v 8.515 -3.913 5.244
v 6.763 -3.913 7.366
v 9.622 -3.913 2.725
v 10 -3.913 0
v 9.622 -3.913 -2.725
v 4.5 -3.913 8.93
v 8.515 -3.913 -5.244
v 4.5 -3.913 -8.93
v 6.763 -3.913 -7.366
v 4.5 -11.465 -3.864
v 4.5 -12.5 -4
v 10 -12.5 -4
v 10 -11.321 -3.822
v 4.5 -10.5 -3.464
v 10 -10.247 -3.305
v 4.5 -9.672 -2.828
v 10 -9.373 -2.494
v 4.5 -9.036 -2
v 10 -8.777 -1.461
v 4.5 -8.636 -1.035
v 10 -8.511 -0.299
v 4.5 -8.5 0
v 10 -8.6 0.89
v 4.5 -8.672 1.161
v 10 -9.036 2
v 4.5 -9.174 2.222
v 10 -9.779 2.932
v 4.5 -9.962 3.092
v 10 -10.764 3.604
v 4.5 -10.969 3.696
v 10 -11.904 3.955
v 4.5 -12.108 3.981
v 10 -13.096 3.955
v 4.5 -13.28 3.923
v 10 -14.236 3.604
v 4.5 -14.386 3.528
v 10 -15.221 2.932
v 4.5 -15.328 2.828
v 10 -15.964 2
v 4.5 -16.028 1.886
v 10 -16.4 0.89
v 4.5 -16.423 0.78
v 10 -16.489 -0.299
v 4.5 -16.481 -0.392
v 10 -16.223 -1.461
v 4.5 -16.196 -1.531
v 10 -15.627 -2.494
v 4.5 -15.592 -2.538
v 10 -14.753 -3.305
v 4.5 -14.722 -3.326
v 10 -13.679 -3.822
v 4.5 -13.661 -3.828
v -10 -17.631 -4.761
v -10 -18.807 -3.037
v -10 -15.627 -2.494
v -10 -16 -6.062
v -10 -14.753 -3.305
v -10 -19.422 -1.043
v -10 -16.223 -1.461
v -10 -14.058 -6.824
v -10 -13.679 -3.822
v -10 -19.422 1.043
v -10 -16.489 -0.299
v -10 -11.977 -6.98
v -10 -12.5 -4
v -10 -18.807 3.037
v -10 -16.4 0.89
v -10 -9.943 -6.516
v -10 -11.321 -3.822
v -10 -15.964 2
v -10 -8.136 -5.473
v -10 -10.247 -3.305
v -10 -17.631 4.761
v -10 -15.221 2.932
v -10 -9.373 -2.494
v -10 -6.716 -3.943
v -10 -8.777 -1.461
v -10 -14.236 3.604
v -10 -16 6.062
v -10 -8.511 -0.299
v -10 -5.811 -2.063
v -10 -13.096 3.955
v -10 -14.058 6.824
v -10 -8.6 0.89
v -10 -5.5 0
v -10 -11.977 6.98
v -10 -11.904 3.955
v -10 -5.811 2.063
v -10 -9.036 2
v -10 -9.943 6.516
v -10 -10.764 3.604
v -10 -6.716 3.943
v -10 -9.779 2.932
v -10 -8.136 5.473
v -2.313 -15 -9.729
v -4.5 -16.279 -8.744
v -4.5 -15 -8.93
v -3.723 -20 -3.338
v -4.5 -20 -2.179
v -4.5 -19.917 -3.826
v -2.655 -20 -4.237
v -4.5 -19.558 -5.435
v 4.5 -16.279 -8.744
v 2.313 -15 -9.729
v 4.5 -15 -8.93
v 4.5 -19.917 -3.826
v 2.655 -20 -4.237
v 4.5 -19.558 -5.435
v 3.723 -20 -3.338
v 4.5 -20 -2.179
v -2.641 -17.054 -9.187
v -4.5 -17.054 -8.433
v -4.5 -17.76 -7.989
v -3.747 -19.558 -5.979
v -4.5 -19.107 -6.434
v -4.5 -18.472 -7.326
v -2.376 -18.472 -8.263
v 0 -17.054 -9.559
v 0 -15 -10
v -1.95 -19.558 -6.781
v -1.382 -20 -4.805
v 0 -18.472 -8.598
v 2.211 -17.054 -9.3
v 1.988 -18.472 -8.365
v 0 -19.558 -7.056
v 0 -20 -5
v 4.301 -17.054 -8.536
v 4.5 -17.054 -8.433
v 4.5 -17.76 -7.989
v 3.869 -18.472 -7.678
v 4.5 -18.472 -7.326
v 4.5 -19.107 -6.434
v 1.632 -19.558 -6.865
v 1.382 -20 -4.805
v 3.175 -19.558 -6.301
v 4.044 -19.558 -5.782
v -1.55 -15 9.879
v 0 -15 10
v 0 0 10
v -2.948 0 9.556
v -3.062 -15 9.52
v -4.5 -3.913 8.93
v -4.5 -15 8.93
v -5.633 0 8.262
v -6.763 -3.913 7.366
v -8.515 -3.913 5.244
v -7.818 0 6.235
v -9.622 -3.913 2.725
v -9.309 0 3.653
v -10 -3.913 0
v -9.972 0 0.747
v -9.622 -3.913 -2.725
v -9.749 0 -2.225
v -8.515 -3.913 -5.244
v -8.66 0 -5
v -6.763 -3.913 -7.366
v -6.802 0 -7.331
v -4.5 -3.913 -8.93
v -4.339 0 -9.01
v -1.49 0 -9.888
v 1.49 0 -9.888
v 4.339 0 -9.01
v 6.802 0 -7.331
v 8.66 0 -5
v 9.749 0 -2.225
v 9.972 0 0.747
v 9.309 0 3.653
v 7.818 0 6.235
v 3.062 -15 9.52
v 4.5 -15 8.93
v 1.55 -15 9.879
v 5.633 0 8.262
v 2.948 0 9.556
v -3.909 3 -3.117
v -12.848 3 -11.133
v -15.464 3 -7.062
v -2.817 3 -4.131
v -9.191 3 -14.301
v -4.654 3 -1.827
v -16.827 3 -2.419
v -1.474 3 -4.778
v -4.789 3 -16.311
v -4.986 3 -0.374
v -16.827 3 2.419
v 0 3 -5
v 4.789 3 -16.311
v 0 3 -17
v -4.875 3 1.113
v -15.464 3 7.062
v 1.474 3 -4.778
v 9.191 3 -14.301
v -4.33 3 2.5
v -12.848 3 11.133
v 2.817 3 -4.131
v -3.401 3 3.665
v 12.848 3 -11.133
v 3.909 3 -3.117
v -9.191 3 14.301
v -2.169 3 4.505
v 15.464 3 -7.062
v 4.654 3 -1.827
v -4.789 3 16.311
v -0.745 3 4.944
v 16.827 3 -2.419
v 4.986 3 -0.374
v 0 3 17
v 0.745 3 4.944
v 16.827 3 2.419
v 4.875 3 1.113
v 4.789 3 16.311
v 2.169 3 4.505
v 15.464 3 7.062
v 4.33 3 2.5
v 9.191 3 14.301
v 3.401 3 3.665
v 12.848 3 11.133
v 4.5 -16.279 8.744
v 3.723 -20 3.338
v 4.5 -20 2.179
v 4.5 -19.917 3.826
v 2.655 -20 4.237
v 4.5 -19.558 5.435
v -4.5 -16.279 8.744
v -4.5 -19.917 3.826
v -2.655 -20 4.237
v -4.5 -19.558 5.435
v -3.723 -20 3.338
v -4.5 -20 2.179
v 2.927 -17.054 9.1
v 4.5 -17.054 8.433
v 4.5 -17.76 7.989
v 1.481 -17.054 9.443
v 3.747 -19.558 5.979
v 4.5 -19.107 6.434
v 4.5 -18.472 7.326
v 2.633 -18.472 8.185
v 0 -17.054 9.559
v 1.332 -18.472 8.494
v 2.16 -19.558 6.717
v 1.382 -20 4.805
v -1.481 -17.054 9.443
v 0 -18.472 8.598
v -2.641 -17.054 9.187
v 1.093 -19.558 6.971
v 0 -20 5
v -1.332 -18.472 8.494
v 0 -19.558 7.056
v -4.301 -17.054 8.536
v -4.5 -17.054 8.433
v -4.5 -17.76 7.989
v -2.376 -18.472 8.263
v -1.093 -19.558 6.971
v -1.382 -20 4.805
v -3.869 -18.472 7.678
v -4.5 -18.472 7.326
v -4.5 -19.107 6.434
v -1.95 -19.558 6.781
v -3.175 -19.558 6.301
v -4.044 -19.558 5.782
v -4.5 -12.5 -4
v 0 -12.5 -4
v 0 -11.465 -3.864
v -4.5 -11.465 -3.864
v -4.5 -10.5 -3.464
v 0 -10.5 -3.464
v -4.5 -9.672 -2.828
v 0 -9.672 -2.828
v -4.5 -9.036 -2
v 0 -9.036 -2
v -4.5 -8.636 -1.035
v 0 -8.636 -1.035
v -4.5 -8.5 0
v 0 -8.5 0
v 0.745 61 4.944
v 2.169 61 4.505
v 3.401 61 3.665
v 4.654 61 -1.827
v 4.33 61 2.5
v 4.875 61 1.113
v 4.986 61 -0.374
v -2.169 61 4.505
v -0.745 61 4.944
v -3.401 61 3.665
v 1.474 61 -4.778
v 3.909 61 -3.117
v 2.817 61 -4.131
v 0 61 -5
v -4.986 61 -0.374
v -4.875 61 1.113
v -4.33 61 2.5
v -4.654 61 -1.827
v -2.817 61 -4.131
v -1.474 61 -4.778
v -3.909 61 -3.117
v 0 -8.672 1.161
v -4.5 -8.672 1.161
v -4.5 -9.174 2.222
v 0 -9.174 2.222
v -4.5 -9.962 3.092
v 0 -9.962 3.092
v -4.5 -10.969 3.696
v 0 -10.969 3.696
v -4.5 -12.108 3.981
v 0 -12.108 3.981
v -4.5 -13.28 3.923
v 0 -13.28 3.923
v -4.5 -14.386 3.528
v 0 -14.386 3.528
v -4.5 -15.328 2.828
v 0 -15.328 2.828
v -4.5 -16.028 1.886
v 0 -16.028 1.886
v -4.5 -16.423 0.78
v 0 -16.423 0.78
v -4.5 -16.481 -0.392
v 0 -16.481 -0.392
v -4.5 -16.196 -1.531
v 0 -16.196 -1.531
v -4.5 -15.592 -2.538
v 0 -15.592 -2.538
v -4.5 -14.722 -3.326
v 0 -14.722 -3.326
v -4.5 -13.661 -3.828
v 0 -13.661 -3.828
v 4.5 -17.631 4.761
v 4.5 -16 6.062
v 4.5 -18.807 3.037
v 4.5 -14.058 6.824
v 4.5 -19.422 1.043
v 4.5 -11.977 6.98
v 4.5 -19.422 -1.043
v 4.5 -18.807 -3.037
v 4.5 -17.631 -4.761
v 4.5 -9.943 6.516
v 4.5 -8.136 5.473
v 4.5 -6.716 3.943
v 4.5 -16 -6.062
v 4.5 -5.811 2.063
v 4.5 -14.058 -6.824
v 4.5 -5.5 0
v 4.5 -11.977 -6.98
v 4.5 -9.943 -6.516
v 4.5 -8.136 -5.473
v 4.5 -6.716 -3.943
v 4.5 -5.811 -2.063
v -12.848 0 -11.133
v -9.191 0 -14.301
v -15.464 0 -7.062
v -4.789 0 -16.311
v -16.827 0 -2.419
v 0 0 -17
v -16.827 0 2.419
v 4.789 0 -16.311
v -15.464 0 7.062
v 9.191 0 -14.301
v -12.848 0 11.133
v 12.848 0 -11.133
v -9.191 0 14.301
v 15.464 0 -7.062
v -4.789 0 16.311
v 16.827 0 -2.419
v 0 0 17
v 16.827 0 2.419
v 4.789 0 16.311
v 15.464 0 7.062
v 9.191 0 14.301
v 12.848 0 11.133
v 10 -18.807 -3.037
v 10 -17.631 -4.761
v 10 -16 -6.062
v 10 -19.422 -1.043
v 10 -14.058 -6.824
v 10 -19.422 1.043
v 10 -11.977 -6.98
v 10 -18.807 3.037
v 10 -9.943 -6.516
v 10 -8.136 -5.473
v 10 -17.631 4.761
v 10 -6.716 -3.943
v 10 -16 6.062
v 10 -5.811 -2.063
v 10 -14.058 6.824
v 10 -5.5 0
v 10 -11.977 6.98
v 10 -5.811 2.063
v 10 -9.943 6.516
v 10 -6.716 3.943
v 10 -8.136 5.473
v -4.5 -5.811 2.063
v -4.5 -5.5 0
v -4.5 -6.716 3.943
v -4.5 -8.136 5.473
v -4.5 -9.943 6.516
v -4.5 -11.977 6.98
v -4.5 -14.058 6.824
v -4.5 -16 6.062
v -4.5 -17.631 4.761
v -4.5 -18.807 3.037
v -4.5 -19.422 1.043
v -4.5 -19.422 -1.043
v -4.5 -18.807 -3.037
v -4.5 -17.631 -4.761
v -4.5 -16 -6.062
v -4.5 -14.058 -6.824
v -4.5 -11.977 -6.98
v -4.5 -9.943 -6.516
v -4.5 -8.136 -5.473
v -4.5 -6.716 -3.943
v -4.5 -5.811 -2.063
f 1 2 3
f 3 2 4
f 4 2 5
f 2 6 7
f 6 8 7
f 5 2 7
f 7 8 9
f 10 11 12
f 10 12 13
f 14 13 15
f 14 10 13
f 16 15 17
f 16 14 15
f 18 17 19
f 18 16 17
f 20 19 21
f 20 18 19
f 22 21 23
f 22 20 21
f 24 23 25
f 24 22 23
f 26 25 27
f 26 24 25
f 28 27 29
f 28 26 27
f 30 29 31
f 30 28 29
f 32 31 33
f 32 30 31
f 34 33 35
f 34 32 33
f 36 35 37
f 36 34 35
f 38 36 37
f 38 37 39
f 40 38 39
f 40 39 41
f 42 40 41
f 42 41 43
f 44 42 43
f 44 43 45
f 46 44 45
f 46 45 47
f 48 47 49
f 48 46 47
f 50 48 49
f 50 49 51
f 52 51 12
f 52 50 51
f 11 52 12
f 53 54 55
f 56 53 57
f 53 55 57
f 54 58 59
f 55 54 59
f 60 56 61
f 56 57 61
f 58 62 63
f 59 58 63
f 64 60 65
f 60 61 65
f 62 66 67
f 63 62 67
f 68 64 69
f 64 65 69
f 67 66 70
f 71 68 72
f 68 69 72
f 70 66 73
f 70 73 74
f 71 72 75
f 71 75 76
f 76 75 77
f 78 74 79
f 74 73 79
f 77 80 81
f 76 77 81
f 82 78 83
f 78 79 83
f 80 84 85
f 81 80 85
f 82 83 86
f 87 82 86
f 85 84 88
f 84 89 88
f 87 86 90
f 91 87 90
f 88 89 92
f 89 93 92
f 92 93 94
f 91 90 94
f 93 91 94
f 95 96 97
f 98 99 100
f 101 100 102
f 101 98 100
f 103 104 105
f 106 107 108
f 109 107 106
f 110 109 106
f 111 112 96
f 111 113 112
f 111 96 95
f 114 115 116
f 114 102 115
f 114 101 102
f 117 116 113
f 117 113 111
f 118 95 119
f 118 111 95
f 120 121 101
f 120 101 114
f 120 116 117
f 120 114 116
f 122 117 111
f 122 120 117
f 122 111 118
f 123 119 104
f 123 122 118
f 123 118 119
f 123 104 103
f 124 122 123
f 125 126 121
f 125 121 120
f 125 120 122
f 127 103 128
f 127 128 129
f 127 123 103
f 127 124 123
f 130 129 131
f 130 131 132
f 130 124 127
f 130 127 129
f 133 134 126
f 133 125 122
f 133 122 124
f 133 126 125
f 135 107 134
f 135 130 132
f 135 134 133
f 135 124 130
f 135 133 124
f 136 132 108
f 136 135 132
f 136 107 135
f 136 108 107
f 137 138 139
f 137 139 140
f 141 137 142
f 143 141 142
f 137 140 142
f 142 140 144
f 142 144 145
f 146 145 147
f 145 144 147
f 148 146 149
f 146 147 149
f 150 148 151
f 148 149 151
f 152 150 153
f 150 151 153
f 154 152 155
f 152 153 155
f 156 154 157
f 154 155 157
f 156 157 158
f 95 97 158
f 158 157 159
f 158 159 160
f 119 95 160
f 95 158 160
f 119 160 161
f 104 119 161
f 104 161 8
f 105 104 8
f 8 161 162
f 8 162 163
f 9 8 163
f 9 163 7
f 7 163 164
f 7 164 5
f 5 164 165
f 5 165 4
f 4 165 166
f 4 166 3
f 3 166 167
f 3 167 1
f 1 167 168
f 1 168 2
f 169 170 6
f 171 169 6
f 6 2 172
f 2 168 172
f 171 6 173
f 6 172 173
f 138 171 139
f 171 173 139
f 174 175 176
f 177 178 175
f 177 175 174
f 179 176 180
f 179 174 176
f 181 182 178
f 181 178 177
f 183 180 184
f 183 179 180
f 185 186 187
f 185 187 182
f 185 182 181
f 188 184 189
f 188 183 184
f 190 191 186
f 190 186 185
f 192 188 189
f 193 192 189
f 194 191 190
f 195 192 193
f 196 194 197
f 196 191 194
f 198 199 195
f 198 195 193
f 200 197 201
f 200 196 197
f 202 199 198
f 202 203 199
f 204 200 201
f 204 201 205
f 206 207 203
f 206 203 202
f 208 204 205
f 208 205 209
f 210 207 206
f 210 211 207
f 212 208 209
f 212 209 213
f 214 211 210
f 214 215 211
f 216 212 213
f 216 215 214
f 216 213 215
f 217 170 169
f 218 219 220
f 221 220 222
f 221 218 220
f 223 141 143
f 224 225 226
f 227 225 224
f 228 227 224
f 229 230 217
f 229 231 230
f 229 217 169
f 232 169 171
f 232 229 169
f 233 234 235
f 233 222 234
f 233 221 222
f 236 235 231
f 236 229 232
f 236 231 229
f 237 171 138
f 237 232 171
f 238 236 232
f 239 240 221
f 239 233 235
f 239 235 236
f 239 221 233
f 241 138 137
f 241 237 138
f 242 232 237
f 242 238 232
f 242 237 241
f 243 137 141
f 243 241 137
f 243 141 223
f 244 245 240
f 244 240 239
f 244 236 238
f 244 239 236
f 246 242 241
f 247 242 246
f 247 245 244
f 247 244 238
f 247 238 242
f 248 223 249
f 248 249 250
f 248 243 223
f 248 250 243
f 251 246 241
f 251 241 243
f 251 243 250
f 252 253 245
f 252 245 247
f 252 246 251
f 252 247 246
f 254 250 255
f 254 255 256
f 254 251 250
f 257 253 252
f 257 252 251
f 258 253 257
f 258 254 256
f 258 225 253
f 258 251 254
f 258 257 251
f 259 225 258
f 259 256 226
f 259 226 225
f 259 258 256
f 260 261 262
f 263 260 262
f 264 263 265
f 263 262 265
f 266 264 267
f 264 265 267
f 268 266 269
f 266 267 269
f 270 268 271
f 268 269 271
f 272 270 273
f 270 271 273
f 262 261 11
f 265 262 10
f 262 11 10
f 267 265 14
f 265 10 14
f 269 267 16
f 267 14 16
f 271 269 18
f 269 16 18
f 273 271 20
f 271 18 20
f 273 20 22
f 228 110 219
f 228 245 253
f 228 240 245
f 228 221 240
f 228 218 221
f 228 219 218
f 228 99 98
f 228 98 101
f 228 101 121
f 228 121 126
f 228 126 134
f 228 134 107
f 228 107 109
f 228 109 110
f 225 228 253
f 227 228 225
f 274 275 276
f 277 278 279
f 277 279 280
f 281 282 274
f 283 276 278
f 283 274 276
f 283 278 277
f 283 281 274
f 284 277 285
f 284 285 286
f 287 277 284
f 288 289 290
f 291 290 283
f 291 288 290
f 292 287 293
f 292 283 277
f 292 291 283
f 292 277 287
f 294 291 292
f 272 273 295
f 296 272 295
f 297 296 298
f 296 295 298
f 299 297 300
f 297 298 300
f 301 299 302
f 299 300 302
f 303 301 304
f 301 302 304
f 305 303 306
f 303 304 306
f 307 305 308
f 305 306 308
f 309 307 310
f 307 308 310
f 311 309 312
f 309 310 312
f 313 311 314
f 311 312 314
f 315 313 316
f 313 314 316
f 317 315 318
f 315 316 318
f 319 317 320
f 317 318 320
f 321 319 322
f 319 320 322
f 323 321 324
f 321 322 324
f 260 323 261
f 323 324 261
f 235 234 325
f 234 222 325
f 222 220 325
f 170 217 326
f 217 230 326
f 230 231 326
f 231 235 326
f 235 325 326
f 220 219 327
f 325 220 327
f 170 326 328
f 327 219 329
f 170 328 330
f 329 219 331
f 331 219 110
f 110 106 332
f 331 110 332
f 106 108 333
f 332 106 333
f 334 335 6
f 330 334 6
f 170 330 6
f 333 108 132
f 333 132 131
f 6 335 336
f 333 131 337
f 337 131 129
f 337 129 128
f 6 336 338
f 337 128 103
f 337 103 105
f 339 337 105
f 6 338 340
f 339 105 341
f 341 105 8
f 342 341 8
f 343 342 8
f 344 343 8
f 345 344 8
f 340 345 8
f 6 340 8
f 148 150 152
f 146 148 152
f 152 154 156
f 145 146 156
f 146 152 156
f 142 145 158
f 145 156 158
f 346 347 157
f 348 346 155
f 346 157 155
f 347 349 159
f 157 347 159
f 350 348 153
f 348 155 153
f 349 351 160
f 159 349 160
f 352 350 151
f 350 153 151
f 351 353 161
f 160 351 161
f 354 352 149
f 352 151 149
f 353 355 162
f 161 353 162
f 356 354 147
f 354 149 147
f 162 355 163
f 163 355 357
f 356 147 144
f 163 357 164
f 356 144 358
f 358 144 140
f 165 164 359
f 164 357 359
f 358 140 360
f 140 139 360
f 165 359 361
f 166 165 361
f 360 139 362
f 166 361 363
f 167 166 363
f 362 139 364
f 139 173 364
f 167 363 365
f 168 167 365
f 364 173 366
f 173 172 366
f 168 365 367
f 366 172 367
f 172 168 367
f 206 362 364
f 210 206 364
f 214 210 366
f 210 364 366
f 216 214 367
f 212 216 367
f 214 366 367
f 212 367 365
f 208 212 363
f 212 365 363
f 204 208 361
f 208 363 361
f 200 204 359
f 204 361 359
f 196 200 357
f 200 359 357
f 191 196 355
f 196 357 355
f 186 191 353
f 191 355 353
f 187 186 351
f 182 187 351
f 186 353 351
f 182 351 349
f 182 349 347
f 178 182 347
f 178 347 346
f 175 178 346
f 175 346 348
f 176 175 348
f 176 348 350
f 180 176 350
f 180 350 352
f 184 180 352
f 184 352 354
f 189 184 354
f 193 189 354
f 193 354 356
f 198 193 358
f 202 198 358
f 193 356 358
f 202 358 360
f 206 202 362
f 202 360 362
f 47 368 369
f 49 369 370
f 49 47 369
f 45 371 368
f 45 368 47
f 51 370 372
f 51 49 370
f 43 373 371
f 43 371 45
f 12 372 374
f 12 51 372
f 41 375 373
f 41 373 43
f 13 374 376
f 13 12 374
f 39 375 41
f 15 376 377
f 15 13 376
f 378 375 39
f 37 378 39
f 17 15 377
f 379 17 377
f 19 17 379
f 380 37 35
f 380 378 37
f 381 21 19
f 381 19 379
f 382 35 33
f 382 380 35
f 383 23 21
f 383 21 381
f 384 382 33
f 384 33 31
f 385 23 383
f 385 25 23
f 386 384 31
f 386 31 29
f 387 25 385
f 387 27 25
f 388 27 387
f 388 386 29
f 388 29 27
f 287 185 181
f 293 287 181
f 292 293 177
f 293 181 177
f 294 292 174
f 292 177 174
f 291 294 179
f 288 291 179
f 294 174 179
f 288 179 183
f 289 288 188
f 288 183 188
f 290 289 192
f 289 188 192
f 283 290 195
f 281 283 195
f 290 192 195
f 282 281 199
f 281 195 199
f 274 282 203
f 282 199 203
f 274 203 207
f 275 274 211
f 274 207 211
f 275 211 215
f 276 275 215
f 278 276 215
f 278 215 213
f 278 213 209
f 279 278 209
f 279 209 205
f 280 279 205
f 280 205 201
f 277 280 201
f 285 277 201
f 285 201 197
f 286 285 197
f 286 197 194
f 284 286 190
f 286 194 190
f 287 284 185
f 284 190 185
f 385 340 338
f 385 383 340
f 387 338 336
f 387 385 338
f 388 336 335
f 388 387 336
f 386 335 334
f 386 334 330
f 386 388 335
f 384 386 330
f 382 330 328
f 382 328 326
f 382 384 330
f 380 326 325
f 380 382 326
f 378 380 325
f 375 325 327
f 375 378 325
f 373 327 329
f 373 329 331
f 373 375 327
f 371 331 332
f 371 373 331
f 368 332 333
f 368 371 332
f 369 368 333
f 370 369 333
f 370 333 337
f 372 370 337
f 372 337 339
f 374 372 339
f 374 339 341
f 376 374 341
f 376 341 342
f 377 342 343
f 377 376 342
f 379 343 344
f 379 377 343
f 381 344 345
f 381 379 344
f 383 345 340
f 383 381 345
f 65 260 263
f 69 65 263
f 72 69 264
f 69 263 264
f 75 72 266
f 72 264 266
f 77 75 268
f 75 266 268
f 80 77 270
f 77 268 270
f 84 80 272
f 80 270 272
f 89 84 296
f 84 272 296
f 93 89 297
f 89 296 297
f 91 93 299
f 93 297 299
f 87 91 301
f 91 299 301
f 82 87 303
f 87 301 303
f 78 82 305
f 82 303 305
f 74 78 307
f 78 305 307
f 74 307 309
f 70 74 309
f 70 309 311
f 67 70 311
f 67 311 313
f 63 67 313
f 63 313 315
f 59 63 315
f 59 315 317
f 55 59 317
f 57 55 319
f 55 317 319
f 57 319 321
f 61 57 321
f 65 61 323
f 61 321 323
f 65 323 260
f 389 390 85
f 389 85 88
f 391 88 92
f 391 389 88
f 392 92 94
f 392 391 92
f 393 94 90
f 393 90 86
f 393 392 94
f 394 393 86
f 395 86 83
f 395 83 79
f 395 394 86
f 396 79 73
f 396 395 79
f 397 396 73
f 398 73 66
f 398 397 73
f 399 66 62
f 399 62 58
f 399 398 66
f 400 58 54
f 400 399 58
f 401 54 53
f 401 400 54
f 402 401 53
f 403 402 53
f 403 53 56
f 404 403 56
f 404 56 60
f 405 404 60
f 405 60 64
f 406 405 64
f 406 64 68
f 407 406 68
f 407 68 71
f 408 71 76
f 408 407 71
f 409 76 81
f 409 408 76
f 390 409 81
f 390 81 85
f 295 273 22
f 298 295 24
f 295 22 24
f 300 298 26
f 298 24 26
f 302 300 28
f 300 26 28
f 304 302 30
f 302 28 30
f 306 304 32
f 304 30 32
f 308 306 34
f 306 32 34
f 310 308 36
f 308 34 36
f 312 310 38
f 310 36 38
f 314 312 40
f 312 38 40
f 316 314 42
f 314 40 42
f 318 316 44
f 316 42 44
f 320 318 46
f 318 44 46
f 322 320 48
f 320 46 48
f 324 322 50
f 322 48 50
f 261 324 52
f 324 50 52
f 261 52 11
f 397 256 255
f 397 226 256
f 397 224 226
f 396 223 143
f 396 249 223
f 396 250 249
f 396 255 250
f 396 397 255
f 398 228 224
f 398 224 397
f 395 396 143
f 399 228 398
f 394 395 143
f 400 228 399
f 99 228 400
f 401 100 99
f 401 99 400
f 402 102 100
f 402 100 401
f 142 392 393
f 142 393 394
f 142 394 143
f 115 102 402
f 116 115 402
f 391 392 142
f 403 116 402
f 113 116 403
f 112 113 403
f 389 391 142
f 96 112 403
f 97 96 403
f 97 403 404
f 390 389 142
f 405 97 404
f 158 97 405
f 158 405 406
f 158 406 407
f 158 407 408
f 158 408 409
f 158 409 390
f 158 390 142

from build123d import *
from build123d.topology import SkipClean

# Parameters (mm, degrees)
SKETCH1_R           = 17
BOSS_EXTRUDE1_DEPTH = 3
SKETCH2_R           = 5
BOSS_EXTRUDE2_DEPTH = 58
SKETCH3_R           = 10
BOSS_EXTRUDE3_DEPTH = 20
FILLET1_R           = 5
CUT_EXTRUDE1_START  = -8.930286
SKETCH4_W           = 7.220401321
SKETCH4_H           = 16.086512415
CUT_EXTRUDE1_DEPTH  = 17.860572
SKETCH5_R           = 4
CUT_EXTRUDE2_DEPTH  = 20
SKETCH6_R           = 7
SKETCH6_R_2         = 4
BOSS_EXTRUDE4_DEPTH = 10


with BuildPart() as part:
    # Sketch1 → Boss-Extrude1 (new body)
    with BuildSketch(Plane(origin=(0, 0, 0), x_dir=(1, 0, 0), z_dir=(0, 1, 0))):
        with Locations(Location((0, 0, 0), (0, 0, 270))):
            Circle(SKETCH1_R)
    extrude(amount=BOSS_EXTRUDE1_DEPTH)

    # Sketch2 → Boss-Extrude2 (add)
    with BuildSketch(Plane(origin=(0, 3, 0), x_dir=(1, 0, 0), z_dir=(0, 1, 0))):
        with Locations(Location((0, 0, 0), (0, 0, 90))):
            Circle(SKETCH2_R)
    extrude(amount=BOSS_EXTRUDE2_DEPTH)

    # Sketch3 → Boss-Extrude3 (add)
    with BuildSketch(Plane.XZ):
        with Locations(Location((0, 0, 0), (0, 0, 90))):
            Circle(SKETCH3_R)
    extrude(amount=BOSS_EXTRUDE3_DEPTH)

    # Fillet1
    fillet1_edges = [part.edges().sort_by_distance(p)[0] for p in [
        (0, -20, -10),
    ]]
    fillet(fillet1_edges, radius=FILLET1_R)

    # Sketch4 → Cut-Extrude1 (cut)
    with BuildSketch(Plane.XY.offset(CUT_EXTRUDE1_START)):
        with Locations((8.110200661, -11.956743792)):
            Rectangle(SKETCH4_W, SKETCH4_H)
        with Locations((-8.110200661, -11.956743792)):
            Rectangle(SKETCH4_W, SKETCH4_H)
    extrude(amount=CUT_EXTRUDE1_DEPTH, mode=Mode.SUBTRACT)

    # Sketch5 → Cut-Extrude2 (cut)
    with BuildSketch(Plane(origin=(4.5, 0, 0), x_dir=(0, 0, -1), z_dir=(1, 0, 0))):
        with Locations(Location((0, -12.5, 0), (0, 0, 90))):
            Circle(SKETCH5_R)
    extrude(amount=-CUT_EXTRUDE2_DEPTH, mode=Mode.SUBTRACT)

    # Sketch6 → Boss-Extrude4 (add, symmetric)
    with SkipClean():  # the faces are left unmerged after this step: merging them gives an invalid solid
        with BuildSketch(Plane(origin=(0, 0, 0), x_dir=(0, 0, -1), z_dir=(1, 0, 0))):
            with Locations(Location((0, -12.5, 0), (0, 0, 90))):
                Circle(SKETCH6_R)
            with Locations((0, -12.5)):
                Circle(SKETCH6_R_2, mode=Mode.SUBTRACT)
        extrude(amount=BOSS_EXTRUDE4_DEPTH, both=True)


solid = part.part
